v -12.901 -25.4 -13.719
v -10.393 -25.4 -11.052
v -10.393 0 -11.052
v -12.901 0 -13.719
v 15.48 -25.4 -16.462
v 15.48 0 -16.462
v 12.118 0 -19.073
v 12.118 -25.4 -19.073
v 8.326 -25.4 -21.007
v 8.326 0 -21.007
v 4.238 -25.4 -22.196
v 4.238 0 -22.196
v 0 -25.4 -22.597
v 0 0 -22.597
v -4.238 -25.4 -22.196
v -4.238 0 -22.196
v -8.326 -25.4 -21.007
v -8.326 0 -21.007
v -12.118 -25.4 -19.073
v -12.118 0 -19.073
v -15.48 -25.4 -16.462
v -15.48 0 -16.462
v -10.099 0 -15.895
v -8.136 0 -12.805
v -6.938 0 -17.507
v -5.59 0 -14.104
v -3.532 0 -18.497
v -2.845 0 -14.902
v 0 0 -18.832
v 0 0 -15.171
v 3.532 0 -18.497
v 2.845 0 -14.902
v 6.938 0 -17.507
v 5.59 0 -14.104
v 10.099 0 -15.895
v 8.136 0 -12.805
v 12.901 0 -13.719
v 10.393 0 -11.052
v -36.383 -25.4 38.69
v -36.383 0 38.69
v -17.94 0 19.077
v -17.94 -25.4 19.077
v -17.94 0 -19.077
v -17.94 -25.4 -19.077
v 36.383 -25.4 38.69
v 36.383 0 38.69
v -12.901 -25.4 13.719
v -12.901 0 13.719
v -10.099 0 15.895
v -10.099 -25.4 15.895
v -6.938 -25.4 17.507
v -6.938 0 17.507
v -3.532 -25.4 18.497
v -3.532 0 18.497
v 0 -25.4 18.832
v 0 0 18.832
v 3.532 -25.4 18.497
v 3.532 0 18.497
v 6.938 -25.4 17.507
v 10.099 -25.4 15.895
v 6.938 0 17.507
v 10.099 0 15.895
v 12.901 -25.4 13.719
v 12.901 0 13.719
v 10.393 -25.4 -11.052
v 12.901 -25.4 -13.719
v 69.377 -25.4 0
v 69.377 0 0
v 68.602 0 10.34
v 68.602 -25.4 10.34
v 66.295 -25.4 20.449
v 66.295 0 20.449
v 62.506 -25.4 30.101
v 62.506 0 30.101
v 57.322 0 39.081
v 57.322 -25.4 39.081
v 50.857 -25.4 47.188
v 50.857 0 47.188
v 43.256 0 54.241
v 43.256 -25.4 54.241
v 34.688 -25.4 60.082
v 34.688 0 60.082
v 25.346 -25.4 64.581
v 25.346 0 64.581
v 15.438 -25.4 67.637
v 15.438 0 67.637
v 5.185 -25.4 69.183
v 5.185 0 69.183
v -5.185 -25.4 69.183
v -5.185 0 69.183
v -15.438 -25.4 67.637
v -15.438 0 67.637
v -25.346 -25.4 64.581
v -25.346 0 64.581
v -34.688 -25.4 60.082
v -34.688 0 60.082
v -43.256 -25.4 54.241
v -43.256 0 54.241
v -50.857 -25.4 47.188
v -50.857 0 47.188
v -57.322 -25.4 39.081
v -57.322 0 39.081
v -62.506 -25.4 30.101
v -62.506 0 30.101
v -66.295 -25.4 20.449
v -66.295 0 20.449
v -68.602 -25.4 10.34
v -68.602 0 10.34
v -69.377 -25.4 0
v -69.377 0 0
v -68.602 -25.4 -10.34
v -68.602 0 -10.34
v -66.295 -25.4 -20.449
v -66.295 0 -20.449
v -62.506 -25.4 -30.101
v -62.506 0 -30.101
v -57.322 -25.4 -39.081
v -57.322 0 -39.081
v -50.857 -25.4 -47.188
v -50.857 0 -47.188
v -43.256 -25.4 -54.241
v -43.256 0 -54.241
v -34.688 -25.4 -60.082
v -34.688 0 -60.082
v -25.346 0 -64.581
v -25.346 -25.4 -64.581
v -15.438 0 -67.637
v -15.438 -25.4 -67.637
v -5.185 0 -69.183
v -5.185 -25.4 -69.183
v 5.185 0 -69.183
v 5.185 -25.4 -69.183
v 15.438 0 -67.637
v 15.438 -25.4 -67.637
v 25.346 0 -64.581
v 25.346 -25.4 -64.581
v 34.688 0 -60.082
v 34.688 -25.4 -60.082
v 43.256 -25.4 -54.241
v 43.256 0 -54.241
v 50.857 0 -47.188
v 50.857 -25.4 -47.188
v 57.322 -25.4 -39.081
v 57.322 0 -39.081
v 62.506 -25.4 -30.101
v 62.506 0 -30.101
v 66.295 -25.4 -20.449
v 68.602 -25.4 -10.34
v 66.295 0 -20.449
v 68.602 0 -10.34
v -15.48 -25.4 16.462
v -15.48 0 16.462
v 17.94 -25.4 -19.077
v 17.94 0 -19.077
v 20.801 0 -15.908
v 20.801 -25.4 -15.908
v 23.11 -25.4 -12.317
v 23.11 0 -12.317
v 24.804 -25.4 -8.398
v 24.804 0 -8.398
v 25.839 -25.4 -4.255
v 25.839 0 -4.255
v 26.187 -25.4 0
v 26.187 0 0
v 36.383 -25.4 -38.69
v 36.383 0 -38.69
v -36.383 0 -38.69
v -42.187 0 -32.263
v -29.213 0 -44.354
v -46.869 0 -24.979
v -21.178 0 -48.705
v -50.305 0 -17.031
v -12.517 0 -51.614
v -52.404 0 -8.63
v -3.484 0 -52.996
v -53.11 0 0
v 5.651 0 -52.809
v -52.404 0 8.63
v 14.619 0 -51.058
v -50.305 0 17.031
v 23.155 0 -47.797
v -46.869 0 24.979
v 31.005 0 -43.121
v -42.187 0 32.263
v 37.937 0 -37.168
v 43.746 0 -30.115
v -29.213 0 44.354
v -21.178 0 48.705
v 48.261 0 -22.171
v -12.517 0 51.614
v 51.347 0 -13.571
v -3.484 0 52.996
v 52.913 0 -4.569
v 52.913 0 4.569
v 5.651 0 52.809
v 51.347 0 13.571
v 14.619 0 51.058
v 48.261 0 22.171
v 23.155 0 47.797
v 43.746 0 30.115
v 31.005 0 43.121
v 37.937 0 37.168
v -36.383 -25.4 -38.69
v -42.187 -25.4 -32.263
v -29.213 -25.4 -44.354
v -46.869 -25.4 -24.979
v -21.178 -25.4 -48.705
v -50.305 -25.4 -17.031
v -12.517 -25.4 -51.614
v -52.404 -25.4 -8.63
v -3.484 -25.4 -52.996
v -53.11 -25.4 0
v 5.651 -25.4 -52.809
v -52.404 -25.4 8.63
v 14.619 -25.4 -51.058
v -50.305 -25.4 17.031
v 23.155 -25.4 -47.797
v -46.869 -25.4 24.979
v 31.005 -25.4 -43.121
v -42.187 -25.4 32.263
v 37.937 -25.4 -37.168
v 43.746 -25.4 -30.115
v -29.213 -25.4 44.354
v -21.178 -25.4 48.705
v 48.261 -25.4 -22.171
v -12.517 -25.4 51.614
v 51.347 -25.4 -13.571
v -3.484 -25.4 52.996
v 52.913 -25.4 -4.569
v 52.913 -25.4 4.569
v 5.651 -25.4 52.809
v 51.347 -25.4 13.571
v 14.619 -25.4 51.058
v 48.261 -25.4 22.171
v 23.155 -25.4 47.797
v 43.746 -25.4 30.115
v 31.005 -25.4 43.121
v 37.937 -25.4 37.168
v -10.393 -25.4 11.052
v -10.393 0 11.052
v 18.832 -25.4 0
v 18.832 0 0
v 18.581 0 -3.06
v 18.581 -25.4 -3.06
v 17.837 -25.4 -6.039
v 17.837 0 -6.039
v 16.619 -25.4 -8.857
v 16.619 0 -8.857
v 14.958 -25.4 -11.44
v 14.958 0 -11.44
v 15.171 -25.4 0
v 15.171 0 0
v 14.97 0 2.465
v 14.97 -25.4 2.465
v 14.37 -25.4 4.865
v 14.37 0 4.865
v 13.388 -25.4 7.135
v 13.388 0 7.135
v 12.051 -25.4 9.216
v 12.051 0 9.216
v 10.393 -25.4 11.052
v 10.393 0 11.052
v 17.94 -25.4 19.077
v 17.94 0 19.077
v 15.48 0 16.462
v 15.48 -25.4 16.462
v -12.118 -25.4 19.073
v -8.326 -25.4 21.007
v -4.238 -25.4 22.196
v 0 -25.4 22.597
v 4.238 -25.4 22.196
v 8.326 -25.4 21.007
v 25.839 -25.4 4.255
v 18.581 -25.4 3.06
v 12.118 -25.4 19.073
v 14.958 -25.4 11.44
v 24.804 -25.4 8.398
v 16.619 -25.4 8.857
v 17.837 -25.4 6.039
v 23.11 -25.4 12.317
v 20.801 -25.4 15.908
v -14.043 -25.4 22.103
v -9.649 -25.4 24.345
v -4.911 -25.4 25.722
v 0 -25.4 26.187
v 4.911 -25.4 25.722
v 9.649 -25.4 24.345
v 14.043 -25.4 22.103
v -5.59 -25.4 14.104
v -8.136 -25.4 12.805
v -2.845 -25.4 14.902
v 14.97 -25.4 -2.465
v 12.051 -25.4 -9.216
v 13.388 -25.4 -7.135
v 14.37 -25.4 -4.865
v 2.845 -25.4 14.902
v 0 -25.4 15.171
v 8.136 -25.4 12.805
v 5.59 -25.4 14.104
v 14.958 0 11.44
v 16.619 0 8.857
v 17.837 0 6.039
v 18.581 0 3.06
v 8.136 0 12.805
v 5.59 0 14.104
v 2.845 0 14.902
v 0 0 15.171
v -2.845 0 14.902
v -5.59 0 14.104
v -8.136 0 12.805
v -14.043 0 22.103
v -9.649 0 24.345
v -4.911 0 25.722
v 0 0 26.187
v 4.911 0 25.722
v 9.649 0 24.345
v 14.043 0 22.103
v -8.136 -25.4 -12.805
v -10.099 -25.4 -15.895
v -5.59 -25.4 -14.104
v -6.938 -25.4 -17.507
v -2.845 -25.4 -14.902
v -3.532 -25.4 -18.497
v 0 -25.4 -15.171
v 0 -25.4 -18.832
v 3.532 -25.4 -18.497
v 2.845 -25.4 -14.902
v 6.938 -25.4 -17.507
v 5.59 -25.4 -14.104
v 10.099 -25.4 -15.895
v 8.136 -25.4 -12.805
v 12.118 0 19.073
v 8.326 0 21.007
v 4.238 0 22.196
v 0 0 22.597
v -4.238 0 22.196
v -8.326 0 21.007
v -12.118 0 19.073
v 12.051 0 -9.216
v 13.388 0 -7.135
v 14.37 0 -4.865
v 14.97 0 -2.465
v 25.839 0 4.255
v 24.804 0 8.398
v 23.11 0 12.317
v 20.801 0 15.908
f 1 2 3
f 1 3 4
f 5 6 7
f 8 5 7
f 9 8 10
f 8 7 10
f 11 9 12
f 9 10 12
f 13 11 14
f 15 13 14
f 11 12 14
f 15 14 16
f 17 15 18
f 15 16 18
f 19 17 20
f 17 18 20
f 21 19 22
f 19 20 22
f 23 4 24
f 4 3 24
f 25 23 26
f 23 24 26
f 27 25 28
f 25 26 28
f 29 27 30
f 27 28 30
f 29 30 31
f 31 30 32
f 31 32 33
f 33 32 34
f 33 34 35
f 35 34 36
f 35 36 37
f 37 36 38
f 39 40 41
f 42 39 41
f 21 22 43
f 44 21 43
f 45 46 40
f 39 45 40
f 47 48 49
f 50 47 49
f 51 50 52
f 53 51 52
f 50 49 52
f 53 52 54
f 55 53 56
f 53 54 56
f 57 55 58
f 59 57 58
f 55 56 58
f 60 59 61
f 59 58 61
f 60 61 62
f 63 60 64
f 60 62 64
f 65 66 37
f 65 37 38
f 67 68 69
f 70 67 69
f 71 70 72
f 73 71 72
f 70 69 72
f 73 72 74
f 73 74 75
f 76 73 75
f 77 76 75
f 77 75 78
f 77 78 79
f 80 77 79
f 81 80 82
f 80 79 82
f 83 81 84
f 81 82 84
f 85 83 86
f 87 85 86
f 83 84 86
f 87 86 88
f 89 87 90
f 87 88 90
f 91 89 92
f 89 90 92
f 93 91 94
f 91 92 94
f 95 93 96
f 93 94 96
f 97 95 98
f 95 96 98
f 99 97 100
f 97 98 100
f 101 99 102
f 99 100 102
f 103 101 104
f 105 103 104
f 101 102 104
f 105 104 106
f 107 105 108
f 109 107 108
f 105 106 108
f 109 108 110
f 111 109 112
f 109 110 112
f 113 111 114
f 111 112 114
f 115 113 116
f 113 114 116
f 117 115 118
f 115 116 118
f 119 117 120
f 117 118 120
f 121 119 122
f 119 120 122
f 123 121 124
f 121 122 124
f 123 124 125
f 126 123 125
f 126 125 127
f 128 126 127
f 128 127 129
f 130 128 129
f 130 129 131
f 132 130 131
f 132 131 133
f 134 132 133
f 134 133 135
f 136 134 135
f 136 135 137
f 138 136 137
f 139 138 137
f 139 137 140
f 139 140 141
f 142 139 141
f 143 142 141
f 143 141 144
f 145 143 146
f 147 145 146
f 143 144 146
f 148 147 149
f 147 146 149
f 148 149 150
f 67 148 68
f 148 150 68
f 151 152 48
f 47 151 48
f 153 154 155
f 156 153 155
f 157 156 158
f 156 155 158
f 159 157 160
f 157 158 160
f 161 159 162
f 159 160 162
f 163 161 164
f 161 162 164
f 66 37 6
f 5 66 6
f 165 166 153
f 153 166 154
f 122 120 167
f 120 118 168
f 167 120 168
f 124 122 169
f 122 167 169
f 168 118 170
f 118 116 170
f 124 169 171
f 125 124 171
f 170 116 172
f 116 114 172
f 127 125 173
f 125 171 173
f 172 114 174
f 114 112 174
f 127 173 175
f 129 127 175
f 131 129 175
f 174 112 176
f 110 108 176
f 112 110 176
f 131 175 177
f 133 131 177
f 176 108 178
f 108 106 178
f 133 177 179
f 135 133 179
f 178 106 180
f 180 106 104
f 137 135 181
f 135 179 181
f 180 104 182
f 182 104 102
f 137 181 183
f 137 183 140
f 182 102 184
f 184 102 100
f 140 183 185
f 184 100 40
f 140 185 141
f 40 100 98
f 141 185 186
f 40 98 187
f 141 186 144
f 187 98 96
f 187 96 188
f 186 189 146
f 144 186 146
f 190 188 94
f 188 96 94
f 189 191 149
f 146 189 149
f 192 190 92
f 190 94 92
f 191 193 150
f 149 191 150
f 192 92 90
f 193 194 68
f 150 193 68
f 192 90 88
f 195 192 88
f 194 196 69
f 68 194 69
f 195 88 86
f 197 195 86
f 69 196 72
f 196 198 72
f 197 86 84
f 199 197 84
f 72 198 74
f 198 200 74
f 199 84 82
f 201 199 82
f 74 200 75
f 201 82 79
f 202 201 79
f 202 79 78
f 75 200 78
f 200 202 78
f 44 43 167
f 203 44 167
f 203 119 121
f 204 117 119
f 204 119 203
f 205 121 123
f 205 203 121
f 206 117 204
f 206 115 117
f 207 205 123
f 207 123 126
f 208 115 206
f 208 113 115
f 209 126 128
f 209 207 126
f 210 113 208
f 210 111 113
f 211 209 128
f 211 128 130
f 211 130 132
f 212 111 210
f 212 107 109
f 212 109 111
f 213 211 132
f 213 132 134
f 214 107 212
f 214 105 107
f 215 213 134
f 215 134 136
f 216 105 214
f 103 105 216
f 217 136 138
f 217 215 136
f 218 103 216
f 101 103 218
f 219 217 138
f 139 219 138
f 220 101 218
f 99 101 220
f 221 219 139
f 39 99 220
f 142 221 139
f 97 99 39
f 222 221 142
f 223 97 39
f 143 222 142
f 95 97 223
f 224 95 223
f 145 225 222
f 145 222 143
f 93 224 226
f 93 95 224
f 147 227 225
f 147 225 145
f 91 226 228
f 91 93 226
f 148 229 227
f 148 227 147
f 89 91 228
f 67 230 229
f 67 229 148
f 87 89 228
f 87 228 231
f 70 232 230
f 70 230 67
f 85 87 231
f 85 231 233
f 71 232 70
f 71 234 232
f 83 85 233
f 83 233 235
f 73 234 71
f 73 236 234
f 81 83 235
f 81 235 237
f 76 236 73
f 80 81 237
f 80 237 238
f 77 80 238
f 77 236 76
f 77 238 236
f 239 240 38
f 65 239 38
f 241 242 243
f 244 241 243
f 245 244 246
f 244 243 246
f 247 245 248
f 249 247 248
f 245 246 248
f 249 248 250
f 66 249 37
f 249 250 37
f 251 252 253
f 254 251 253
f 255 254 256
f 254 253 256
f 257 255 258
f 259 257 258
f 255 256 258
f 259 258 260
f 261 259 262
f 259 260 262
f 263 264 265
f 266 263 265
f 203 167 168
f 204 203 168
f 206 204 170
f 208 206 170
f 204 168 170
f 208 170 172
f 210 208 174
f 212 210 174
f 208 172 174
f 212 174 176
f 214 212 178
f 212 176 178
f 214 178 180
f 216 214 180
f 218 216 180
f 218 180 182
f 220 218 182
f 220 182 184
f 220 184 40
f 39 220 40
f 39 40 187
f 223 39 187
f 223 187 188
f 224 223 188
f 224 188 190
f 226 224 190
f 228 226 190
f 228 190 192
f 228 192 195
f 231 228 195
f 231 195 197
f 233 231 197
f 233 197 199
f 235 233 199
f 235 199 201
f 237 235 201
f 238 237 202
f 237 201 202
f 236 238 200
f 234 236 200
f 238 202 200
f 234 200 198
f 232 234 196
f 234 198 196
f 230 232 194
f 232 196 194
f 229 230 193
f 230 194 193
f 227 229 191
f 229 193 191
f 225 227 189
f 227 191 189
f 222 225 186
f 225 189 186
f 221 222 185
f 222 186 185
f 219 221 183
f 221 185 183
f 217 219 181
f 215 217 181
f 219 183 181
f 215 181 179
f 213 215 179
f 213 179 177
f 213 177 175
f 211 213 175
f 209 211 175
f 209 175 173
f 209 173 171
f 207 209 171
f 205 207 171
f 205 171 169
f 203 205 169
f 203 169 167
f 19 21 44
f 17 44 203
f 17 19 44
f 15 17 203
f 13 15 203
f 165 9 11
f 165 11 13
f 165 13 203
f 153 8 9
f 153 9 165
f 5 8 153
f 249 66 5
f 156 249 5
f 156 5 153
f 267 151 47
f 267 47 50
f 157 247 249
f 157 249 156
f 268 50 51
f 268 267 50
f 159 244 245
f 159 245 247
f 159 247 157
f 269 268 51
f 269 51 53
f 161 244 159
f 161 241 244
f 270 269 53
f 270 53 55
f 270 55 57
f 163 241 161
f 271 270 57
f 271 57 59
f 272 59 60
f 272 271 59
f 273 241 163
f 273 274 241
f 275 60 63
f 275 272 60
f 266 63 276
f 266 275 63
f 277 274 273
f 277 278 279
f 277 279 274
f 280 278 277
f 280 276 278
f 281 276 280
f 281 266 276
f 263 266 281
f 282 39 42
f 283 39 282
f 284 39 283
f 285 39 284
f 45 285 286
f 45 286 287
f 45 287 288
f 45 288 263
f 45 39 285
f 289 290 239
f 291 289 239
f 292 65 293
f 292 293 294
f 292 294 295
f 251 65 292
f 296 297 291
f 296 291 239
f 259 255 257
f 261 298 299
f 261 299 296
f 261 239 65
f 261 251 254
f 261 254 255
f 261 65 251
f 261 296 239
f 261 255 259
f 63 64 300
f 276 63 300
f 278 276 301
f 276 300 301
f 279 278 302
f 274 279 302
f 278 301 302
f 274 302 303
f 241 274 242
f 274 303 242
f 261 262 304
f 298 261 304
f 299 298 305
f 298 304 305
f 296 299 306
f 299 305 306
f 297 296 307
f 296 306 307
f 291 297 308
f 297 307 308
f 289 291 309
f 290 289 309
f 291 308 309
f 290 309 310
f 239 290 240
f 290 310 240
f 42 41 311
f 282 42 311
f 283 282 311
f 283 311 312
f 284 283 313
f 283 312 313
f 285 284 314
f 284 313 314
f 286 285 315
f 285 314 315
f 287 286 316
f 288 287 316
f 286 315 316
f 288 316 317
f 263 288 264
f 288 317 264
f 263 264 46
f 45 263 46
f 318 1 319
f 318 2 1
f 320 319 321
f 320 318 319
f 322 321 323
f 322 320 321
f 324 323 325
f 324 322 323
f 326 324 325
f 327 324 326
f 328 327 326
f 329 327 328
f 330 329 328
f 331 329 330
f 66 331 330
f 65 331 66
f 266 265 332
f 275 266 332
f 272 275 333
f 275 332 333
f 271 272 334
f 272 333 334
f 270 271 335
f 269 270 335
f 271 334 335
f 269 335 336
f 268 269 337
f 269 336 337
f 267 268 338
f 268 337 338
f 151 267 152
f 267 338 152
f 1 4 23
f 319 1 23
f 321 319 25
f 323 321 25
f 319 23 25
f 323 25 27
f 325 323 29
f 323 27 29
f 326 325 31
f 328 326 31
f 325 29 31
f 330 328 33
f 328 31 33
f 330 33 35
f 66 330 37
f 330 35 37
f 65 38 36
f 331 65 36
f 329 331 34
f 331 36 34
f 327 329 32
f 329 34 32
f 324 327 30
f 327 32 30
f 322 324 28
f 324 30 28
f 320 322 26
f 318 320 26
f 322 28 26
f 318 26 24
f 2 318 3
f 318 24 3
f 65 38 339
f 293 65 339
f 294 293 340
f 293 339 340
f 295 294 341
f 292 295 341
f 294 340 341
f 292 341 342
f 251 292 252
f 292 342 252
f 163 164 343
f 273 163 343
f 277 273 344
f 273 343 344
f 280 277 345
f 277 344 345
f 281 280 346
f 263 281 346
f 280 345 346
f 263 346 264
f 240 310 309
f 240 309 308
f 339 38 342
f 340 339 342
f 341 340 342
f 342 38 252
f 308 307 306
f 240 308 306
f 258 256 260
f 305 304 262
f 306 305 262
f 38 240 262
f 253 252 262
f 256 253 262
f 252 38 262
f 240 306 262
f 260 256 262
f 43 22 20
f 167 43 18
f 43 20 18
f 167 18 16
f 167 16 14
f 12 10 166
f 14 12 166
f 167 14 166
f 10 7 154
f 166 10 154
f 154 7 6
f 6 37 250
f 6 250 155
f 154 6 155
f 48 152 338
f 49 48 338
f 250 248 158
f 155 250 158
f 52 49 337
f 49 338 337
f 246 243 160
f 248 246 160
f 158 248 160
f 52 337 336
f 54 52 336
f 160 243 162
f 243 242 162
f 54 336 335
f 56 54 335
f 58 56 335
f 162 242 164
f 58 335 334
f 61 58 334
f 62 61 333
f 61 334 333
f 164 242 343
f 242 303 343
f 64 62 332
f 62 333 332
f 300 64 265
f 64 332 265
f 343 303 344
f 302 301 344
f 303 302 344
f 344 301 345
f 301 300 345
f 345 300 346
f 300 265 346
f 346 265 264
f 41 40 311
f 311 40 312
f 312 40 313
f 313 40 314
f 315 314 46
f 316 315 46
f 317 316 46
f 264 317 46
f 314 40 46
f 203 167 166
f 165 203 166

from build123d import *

# Parameters (mm, degrees)
F0_R     = 69.3767994243
F0_R_2   = 63.285072276
F0_R_3   = 57.9920714967
F1_DEPTH = 25.4


with BuildPart() as f1:
    # F0 (on Front) → F1 (new body)
    with BuildSketch(Plane.XZ):
        Circle(F0_R)
        Circle(F0_R_2, mode=Mode.SUBTRACT)
        Circle(F0_R_2)
        Circle(F0_R_3, mode=Mode.SUBTRACT)
        Circle(F0_R_3)
        with BuildLine():
            ThreePointArc((36.3834976402, 38.6899961749), (48.7493751568, 21.0754152123), (53.1100245203, 0))
            ThreePointArc((53.1100245203, 0), (48.7493751568, -21.0754152123), (36.3834976402, -38.6899961749))
            ThreePointArc((36.3834976402, -38.6899961749), (0, -53.1100245203), (-36.3834976402, -38.6899961749))
            ThreePointArc((-36.3834976402, -38.6899961749), (-53.1100245203, 0), (-36.3834976402, 38.6899961749))
            ThreePointArc((-36.3834976402, 38.6899961749), (0, 53.1100245203), (36.3834976402, 38.6899961749))
        make_face(mode=Mode.SUBTRACT)
    extrude(amount=F1_DEPTH)


with BuildPart() as f1b:
    # F0 (on Front) → F1, piece 2 (new body)
    with BuildSketch(Plane.XZ):
        with BuildLine():
            Line((-36.3834976402, -38.6899961749), (36.3834976402, -38.6899961749))
            Line((36.3834976402, -38.6899961749), (17.9395852578, -19.076848847))
            ThreePointArc((17.9395852578, -19.076848847), (0, -26.1869219488), (-17.9395852578, -19.076848847))
            Line((-17.9395852578, -19.076848847), (-36.3834976402, -38.6899961749))
        make_face()
        with BuildLine():
            ThreePointArc((22.5969677196, 0), (20.7416220707, 8.9670543656), (15.4802549825, 16.4616115796))
            Line((15.4802549825, 16.4616115796), (12.900691587, 13.7185191235))
            ThreePointArc((12.900691587, 13.7185191235), (17.2853269957, 7.4728228278), (18.8315057912, 0))
            ThreePointArc((18.8315057912, 0), (17.2853269957, -7.4728228278), (12.900691587, -13.7185191235))
            Line((12.900691587, -13.7185191235), (15.4802549825, -16.4616115796))
            ThreePointArc((15.4802549825, -16.4616115796), (20.7416220707, -8.9670543656), (22.5969677196, 0))
        make_face()
        with BuildLine():
            Line((12.900691587, 13.7185191235), (15.4802549825, 16.4616115796))
            ThreePointArc((15.4802549825, 16.4616115796), (0, 22.5969677196), (-15.4802549825, 16.4616115796))
            Line((-15.4802549825, 16.4616115796), (-12.900691587, 13.7185191235))
            ThreePointArc((-12.900691587, 13.7185191235), (0, 18.8315057912), (12.900691587, 13.7185191235))
        make_face()
        with BuildLine():
            ThreePointArc((26.1869219488, 0), (24.0368196741, 10.3916399623), (17.9395852578, 19.076848847))
            Line((17.9395852578, 19.076848847), (15.4802549825, 16.4616115796))
            ThreePointArc((15.4802549825, 16.4616115796), (20.7416220707, 8.9670543656), (22.5969677196, 0))
            ThreePointArc((22.5969677196, 0), (20.7416220707, -8.9670543656), (15.4802549825, -16.4616115796))
            Line((15.4802549825, -16.4616115796), (17.9395852578, -19.076848847))
            ThreePointArc((17.9395852578, -19.076848847), (24.0368196741, -10.3916399623), (26.1869219488, 0))
        make_face()
        with BuildLine():
            ThreePointArc((-17.9395852578, -19.076848847), (0, -26.1869219488), (17.9395852578, -19.076848847))
            Line((17.9395852578, -19.076848847), (15.4802549825, -16.4616115796))
            ThreePointArc((15.4802549825, -16.4616115796), (0, -22.5969677196), (-15.4802549825, -16.4616115796))
            Line((-15.4802549825, -16.4616115796), (-17.9395852578, -19.076848847))
        make_face()
    extrude(amount=F1_DEPTH)


with BuildPart() as f1c:
    # F0 (on Front) → F1, piece 3 (new body)
    with BuildSketch(Plane.XZ):
        with BuildLine():
            Line((17.9395852578, 19.076848847), (36.3834976402, 38.6899961749))
            Line((36.3834976402, 38.6899961749), (-36.3834976402, 38.6899961749))
            Line((-36.3834976402, 38.6899961749), (-17.9395852578, 19.076848847))
            ThreePointArc((-17.9395852578, 19.076848847), (0, 26.1869219488), (17.9395852578, 19.076848847))
        make_face()
    extrude(amount=F1_DEPTH)


with BuildPart() as f1d:
    # F0 (on Front) → F1, piece 4 (new body)
    with BuildSketch(Plane.XZ):
        with BuildLine():
            Line((0, 0), (10.3931309404, 11.0519939646))
            ThreePointArc((10.3931309404, 11.0519939646), (0, 15.1711483197), (-10.3931309404, 11.0519939646))
            Line((-10.3931309404, 11.0519939646), (0, 0))
        make_face()
        with BuildLine():
            ThreePointArc((15.1711483197, 0), (13.9255066756, 6.0202994251), (10.3931309404, 11.0519939646))
            Line((10.3931309404, 11.0519939646), (0, 0))
            Line((0, 0), (10.3931309404, -11.0519939646))
            ThreePointArc((10.3931309404, -11.0519939646), (13.9255066756, -6.0202994251), (15.1711483197, 0))
        make_face()
    extrude(amount=F1_DEPTH)


with BuildPart() as f1e:
    # F0 (on Front) → F1, piece 5 (new body)
    with BuildSketch(Plane.XZ):
        with BuildLine():
            ThreePointArc((-12.900691587, -13.7185191235), (0, -18.8315057912), (12.900691587, -13.7185191235))
            Line((12.900691587, -13.7185191235), (10.3931309404, -11.0519939646))
            ThreePointArc((10.3931309404, -11.0519939646), (0, -15.1711483197), (-10.3931309404, -11.0519939646))
            Line((-10.3931309404, -11.0519939646), (-12.900691587, -13.7185191235))
        make_face()
    extrude(amount=F1_DEPTH)


solid = Compound([f1.part, f1b.part, f1c.part, f1d.part, f1e.part])
